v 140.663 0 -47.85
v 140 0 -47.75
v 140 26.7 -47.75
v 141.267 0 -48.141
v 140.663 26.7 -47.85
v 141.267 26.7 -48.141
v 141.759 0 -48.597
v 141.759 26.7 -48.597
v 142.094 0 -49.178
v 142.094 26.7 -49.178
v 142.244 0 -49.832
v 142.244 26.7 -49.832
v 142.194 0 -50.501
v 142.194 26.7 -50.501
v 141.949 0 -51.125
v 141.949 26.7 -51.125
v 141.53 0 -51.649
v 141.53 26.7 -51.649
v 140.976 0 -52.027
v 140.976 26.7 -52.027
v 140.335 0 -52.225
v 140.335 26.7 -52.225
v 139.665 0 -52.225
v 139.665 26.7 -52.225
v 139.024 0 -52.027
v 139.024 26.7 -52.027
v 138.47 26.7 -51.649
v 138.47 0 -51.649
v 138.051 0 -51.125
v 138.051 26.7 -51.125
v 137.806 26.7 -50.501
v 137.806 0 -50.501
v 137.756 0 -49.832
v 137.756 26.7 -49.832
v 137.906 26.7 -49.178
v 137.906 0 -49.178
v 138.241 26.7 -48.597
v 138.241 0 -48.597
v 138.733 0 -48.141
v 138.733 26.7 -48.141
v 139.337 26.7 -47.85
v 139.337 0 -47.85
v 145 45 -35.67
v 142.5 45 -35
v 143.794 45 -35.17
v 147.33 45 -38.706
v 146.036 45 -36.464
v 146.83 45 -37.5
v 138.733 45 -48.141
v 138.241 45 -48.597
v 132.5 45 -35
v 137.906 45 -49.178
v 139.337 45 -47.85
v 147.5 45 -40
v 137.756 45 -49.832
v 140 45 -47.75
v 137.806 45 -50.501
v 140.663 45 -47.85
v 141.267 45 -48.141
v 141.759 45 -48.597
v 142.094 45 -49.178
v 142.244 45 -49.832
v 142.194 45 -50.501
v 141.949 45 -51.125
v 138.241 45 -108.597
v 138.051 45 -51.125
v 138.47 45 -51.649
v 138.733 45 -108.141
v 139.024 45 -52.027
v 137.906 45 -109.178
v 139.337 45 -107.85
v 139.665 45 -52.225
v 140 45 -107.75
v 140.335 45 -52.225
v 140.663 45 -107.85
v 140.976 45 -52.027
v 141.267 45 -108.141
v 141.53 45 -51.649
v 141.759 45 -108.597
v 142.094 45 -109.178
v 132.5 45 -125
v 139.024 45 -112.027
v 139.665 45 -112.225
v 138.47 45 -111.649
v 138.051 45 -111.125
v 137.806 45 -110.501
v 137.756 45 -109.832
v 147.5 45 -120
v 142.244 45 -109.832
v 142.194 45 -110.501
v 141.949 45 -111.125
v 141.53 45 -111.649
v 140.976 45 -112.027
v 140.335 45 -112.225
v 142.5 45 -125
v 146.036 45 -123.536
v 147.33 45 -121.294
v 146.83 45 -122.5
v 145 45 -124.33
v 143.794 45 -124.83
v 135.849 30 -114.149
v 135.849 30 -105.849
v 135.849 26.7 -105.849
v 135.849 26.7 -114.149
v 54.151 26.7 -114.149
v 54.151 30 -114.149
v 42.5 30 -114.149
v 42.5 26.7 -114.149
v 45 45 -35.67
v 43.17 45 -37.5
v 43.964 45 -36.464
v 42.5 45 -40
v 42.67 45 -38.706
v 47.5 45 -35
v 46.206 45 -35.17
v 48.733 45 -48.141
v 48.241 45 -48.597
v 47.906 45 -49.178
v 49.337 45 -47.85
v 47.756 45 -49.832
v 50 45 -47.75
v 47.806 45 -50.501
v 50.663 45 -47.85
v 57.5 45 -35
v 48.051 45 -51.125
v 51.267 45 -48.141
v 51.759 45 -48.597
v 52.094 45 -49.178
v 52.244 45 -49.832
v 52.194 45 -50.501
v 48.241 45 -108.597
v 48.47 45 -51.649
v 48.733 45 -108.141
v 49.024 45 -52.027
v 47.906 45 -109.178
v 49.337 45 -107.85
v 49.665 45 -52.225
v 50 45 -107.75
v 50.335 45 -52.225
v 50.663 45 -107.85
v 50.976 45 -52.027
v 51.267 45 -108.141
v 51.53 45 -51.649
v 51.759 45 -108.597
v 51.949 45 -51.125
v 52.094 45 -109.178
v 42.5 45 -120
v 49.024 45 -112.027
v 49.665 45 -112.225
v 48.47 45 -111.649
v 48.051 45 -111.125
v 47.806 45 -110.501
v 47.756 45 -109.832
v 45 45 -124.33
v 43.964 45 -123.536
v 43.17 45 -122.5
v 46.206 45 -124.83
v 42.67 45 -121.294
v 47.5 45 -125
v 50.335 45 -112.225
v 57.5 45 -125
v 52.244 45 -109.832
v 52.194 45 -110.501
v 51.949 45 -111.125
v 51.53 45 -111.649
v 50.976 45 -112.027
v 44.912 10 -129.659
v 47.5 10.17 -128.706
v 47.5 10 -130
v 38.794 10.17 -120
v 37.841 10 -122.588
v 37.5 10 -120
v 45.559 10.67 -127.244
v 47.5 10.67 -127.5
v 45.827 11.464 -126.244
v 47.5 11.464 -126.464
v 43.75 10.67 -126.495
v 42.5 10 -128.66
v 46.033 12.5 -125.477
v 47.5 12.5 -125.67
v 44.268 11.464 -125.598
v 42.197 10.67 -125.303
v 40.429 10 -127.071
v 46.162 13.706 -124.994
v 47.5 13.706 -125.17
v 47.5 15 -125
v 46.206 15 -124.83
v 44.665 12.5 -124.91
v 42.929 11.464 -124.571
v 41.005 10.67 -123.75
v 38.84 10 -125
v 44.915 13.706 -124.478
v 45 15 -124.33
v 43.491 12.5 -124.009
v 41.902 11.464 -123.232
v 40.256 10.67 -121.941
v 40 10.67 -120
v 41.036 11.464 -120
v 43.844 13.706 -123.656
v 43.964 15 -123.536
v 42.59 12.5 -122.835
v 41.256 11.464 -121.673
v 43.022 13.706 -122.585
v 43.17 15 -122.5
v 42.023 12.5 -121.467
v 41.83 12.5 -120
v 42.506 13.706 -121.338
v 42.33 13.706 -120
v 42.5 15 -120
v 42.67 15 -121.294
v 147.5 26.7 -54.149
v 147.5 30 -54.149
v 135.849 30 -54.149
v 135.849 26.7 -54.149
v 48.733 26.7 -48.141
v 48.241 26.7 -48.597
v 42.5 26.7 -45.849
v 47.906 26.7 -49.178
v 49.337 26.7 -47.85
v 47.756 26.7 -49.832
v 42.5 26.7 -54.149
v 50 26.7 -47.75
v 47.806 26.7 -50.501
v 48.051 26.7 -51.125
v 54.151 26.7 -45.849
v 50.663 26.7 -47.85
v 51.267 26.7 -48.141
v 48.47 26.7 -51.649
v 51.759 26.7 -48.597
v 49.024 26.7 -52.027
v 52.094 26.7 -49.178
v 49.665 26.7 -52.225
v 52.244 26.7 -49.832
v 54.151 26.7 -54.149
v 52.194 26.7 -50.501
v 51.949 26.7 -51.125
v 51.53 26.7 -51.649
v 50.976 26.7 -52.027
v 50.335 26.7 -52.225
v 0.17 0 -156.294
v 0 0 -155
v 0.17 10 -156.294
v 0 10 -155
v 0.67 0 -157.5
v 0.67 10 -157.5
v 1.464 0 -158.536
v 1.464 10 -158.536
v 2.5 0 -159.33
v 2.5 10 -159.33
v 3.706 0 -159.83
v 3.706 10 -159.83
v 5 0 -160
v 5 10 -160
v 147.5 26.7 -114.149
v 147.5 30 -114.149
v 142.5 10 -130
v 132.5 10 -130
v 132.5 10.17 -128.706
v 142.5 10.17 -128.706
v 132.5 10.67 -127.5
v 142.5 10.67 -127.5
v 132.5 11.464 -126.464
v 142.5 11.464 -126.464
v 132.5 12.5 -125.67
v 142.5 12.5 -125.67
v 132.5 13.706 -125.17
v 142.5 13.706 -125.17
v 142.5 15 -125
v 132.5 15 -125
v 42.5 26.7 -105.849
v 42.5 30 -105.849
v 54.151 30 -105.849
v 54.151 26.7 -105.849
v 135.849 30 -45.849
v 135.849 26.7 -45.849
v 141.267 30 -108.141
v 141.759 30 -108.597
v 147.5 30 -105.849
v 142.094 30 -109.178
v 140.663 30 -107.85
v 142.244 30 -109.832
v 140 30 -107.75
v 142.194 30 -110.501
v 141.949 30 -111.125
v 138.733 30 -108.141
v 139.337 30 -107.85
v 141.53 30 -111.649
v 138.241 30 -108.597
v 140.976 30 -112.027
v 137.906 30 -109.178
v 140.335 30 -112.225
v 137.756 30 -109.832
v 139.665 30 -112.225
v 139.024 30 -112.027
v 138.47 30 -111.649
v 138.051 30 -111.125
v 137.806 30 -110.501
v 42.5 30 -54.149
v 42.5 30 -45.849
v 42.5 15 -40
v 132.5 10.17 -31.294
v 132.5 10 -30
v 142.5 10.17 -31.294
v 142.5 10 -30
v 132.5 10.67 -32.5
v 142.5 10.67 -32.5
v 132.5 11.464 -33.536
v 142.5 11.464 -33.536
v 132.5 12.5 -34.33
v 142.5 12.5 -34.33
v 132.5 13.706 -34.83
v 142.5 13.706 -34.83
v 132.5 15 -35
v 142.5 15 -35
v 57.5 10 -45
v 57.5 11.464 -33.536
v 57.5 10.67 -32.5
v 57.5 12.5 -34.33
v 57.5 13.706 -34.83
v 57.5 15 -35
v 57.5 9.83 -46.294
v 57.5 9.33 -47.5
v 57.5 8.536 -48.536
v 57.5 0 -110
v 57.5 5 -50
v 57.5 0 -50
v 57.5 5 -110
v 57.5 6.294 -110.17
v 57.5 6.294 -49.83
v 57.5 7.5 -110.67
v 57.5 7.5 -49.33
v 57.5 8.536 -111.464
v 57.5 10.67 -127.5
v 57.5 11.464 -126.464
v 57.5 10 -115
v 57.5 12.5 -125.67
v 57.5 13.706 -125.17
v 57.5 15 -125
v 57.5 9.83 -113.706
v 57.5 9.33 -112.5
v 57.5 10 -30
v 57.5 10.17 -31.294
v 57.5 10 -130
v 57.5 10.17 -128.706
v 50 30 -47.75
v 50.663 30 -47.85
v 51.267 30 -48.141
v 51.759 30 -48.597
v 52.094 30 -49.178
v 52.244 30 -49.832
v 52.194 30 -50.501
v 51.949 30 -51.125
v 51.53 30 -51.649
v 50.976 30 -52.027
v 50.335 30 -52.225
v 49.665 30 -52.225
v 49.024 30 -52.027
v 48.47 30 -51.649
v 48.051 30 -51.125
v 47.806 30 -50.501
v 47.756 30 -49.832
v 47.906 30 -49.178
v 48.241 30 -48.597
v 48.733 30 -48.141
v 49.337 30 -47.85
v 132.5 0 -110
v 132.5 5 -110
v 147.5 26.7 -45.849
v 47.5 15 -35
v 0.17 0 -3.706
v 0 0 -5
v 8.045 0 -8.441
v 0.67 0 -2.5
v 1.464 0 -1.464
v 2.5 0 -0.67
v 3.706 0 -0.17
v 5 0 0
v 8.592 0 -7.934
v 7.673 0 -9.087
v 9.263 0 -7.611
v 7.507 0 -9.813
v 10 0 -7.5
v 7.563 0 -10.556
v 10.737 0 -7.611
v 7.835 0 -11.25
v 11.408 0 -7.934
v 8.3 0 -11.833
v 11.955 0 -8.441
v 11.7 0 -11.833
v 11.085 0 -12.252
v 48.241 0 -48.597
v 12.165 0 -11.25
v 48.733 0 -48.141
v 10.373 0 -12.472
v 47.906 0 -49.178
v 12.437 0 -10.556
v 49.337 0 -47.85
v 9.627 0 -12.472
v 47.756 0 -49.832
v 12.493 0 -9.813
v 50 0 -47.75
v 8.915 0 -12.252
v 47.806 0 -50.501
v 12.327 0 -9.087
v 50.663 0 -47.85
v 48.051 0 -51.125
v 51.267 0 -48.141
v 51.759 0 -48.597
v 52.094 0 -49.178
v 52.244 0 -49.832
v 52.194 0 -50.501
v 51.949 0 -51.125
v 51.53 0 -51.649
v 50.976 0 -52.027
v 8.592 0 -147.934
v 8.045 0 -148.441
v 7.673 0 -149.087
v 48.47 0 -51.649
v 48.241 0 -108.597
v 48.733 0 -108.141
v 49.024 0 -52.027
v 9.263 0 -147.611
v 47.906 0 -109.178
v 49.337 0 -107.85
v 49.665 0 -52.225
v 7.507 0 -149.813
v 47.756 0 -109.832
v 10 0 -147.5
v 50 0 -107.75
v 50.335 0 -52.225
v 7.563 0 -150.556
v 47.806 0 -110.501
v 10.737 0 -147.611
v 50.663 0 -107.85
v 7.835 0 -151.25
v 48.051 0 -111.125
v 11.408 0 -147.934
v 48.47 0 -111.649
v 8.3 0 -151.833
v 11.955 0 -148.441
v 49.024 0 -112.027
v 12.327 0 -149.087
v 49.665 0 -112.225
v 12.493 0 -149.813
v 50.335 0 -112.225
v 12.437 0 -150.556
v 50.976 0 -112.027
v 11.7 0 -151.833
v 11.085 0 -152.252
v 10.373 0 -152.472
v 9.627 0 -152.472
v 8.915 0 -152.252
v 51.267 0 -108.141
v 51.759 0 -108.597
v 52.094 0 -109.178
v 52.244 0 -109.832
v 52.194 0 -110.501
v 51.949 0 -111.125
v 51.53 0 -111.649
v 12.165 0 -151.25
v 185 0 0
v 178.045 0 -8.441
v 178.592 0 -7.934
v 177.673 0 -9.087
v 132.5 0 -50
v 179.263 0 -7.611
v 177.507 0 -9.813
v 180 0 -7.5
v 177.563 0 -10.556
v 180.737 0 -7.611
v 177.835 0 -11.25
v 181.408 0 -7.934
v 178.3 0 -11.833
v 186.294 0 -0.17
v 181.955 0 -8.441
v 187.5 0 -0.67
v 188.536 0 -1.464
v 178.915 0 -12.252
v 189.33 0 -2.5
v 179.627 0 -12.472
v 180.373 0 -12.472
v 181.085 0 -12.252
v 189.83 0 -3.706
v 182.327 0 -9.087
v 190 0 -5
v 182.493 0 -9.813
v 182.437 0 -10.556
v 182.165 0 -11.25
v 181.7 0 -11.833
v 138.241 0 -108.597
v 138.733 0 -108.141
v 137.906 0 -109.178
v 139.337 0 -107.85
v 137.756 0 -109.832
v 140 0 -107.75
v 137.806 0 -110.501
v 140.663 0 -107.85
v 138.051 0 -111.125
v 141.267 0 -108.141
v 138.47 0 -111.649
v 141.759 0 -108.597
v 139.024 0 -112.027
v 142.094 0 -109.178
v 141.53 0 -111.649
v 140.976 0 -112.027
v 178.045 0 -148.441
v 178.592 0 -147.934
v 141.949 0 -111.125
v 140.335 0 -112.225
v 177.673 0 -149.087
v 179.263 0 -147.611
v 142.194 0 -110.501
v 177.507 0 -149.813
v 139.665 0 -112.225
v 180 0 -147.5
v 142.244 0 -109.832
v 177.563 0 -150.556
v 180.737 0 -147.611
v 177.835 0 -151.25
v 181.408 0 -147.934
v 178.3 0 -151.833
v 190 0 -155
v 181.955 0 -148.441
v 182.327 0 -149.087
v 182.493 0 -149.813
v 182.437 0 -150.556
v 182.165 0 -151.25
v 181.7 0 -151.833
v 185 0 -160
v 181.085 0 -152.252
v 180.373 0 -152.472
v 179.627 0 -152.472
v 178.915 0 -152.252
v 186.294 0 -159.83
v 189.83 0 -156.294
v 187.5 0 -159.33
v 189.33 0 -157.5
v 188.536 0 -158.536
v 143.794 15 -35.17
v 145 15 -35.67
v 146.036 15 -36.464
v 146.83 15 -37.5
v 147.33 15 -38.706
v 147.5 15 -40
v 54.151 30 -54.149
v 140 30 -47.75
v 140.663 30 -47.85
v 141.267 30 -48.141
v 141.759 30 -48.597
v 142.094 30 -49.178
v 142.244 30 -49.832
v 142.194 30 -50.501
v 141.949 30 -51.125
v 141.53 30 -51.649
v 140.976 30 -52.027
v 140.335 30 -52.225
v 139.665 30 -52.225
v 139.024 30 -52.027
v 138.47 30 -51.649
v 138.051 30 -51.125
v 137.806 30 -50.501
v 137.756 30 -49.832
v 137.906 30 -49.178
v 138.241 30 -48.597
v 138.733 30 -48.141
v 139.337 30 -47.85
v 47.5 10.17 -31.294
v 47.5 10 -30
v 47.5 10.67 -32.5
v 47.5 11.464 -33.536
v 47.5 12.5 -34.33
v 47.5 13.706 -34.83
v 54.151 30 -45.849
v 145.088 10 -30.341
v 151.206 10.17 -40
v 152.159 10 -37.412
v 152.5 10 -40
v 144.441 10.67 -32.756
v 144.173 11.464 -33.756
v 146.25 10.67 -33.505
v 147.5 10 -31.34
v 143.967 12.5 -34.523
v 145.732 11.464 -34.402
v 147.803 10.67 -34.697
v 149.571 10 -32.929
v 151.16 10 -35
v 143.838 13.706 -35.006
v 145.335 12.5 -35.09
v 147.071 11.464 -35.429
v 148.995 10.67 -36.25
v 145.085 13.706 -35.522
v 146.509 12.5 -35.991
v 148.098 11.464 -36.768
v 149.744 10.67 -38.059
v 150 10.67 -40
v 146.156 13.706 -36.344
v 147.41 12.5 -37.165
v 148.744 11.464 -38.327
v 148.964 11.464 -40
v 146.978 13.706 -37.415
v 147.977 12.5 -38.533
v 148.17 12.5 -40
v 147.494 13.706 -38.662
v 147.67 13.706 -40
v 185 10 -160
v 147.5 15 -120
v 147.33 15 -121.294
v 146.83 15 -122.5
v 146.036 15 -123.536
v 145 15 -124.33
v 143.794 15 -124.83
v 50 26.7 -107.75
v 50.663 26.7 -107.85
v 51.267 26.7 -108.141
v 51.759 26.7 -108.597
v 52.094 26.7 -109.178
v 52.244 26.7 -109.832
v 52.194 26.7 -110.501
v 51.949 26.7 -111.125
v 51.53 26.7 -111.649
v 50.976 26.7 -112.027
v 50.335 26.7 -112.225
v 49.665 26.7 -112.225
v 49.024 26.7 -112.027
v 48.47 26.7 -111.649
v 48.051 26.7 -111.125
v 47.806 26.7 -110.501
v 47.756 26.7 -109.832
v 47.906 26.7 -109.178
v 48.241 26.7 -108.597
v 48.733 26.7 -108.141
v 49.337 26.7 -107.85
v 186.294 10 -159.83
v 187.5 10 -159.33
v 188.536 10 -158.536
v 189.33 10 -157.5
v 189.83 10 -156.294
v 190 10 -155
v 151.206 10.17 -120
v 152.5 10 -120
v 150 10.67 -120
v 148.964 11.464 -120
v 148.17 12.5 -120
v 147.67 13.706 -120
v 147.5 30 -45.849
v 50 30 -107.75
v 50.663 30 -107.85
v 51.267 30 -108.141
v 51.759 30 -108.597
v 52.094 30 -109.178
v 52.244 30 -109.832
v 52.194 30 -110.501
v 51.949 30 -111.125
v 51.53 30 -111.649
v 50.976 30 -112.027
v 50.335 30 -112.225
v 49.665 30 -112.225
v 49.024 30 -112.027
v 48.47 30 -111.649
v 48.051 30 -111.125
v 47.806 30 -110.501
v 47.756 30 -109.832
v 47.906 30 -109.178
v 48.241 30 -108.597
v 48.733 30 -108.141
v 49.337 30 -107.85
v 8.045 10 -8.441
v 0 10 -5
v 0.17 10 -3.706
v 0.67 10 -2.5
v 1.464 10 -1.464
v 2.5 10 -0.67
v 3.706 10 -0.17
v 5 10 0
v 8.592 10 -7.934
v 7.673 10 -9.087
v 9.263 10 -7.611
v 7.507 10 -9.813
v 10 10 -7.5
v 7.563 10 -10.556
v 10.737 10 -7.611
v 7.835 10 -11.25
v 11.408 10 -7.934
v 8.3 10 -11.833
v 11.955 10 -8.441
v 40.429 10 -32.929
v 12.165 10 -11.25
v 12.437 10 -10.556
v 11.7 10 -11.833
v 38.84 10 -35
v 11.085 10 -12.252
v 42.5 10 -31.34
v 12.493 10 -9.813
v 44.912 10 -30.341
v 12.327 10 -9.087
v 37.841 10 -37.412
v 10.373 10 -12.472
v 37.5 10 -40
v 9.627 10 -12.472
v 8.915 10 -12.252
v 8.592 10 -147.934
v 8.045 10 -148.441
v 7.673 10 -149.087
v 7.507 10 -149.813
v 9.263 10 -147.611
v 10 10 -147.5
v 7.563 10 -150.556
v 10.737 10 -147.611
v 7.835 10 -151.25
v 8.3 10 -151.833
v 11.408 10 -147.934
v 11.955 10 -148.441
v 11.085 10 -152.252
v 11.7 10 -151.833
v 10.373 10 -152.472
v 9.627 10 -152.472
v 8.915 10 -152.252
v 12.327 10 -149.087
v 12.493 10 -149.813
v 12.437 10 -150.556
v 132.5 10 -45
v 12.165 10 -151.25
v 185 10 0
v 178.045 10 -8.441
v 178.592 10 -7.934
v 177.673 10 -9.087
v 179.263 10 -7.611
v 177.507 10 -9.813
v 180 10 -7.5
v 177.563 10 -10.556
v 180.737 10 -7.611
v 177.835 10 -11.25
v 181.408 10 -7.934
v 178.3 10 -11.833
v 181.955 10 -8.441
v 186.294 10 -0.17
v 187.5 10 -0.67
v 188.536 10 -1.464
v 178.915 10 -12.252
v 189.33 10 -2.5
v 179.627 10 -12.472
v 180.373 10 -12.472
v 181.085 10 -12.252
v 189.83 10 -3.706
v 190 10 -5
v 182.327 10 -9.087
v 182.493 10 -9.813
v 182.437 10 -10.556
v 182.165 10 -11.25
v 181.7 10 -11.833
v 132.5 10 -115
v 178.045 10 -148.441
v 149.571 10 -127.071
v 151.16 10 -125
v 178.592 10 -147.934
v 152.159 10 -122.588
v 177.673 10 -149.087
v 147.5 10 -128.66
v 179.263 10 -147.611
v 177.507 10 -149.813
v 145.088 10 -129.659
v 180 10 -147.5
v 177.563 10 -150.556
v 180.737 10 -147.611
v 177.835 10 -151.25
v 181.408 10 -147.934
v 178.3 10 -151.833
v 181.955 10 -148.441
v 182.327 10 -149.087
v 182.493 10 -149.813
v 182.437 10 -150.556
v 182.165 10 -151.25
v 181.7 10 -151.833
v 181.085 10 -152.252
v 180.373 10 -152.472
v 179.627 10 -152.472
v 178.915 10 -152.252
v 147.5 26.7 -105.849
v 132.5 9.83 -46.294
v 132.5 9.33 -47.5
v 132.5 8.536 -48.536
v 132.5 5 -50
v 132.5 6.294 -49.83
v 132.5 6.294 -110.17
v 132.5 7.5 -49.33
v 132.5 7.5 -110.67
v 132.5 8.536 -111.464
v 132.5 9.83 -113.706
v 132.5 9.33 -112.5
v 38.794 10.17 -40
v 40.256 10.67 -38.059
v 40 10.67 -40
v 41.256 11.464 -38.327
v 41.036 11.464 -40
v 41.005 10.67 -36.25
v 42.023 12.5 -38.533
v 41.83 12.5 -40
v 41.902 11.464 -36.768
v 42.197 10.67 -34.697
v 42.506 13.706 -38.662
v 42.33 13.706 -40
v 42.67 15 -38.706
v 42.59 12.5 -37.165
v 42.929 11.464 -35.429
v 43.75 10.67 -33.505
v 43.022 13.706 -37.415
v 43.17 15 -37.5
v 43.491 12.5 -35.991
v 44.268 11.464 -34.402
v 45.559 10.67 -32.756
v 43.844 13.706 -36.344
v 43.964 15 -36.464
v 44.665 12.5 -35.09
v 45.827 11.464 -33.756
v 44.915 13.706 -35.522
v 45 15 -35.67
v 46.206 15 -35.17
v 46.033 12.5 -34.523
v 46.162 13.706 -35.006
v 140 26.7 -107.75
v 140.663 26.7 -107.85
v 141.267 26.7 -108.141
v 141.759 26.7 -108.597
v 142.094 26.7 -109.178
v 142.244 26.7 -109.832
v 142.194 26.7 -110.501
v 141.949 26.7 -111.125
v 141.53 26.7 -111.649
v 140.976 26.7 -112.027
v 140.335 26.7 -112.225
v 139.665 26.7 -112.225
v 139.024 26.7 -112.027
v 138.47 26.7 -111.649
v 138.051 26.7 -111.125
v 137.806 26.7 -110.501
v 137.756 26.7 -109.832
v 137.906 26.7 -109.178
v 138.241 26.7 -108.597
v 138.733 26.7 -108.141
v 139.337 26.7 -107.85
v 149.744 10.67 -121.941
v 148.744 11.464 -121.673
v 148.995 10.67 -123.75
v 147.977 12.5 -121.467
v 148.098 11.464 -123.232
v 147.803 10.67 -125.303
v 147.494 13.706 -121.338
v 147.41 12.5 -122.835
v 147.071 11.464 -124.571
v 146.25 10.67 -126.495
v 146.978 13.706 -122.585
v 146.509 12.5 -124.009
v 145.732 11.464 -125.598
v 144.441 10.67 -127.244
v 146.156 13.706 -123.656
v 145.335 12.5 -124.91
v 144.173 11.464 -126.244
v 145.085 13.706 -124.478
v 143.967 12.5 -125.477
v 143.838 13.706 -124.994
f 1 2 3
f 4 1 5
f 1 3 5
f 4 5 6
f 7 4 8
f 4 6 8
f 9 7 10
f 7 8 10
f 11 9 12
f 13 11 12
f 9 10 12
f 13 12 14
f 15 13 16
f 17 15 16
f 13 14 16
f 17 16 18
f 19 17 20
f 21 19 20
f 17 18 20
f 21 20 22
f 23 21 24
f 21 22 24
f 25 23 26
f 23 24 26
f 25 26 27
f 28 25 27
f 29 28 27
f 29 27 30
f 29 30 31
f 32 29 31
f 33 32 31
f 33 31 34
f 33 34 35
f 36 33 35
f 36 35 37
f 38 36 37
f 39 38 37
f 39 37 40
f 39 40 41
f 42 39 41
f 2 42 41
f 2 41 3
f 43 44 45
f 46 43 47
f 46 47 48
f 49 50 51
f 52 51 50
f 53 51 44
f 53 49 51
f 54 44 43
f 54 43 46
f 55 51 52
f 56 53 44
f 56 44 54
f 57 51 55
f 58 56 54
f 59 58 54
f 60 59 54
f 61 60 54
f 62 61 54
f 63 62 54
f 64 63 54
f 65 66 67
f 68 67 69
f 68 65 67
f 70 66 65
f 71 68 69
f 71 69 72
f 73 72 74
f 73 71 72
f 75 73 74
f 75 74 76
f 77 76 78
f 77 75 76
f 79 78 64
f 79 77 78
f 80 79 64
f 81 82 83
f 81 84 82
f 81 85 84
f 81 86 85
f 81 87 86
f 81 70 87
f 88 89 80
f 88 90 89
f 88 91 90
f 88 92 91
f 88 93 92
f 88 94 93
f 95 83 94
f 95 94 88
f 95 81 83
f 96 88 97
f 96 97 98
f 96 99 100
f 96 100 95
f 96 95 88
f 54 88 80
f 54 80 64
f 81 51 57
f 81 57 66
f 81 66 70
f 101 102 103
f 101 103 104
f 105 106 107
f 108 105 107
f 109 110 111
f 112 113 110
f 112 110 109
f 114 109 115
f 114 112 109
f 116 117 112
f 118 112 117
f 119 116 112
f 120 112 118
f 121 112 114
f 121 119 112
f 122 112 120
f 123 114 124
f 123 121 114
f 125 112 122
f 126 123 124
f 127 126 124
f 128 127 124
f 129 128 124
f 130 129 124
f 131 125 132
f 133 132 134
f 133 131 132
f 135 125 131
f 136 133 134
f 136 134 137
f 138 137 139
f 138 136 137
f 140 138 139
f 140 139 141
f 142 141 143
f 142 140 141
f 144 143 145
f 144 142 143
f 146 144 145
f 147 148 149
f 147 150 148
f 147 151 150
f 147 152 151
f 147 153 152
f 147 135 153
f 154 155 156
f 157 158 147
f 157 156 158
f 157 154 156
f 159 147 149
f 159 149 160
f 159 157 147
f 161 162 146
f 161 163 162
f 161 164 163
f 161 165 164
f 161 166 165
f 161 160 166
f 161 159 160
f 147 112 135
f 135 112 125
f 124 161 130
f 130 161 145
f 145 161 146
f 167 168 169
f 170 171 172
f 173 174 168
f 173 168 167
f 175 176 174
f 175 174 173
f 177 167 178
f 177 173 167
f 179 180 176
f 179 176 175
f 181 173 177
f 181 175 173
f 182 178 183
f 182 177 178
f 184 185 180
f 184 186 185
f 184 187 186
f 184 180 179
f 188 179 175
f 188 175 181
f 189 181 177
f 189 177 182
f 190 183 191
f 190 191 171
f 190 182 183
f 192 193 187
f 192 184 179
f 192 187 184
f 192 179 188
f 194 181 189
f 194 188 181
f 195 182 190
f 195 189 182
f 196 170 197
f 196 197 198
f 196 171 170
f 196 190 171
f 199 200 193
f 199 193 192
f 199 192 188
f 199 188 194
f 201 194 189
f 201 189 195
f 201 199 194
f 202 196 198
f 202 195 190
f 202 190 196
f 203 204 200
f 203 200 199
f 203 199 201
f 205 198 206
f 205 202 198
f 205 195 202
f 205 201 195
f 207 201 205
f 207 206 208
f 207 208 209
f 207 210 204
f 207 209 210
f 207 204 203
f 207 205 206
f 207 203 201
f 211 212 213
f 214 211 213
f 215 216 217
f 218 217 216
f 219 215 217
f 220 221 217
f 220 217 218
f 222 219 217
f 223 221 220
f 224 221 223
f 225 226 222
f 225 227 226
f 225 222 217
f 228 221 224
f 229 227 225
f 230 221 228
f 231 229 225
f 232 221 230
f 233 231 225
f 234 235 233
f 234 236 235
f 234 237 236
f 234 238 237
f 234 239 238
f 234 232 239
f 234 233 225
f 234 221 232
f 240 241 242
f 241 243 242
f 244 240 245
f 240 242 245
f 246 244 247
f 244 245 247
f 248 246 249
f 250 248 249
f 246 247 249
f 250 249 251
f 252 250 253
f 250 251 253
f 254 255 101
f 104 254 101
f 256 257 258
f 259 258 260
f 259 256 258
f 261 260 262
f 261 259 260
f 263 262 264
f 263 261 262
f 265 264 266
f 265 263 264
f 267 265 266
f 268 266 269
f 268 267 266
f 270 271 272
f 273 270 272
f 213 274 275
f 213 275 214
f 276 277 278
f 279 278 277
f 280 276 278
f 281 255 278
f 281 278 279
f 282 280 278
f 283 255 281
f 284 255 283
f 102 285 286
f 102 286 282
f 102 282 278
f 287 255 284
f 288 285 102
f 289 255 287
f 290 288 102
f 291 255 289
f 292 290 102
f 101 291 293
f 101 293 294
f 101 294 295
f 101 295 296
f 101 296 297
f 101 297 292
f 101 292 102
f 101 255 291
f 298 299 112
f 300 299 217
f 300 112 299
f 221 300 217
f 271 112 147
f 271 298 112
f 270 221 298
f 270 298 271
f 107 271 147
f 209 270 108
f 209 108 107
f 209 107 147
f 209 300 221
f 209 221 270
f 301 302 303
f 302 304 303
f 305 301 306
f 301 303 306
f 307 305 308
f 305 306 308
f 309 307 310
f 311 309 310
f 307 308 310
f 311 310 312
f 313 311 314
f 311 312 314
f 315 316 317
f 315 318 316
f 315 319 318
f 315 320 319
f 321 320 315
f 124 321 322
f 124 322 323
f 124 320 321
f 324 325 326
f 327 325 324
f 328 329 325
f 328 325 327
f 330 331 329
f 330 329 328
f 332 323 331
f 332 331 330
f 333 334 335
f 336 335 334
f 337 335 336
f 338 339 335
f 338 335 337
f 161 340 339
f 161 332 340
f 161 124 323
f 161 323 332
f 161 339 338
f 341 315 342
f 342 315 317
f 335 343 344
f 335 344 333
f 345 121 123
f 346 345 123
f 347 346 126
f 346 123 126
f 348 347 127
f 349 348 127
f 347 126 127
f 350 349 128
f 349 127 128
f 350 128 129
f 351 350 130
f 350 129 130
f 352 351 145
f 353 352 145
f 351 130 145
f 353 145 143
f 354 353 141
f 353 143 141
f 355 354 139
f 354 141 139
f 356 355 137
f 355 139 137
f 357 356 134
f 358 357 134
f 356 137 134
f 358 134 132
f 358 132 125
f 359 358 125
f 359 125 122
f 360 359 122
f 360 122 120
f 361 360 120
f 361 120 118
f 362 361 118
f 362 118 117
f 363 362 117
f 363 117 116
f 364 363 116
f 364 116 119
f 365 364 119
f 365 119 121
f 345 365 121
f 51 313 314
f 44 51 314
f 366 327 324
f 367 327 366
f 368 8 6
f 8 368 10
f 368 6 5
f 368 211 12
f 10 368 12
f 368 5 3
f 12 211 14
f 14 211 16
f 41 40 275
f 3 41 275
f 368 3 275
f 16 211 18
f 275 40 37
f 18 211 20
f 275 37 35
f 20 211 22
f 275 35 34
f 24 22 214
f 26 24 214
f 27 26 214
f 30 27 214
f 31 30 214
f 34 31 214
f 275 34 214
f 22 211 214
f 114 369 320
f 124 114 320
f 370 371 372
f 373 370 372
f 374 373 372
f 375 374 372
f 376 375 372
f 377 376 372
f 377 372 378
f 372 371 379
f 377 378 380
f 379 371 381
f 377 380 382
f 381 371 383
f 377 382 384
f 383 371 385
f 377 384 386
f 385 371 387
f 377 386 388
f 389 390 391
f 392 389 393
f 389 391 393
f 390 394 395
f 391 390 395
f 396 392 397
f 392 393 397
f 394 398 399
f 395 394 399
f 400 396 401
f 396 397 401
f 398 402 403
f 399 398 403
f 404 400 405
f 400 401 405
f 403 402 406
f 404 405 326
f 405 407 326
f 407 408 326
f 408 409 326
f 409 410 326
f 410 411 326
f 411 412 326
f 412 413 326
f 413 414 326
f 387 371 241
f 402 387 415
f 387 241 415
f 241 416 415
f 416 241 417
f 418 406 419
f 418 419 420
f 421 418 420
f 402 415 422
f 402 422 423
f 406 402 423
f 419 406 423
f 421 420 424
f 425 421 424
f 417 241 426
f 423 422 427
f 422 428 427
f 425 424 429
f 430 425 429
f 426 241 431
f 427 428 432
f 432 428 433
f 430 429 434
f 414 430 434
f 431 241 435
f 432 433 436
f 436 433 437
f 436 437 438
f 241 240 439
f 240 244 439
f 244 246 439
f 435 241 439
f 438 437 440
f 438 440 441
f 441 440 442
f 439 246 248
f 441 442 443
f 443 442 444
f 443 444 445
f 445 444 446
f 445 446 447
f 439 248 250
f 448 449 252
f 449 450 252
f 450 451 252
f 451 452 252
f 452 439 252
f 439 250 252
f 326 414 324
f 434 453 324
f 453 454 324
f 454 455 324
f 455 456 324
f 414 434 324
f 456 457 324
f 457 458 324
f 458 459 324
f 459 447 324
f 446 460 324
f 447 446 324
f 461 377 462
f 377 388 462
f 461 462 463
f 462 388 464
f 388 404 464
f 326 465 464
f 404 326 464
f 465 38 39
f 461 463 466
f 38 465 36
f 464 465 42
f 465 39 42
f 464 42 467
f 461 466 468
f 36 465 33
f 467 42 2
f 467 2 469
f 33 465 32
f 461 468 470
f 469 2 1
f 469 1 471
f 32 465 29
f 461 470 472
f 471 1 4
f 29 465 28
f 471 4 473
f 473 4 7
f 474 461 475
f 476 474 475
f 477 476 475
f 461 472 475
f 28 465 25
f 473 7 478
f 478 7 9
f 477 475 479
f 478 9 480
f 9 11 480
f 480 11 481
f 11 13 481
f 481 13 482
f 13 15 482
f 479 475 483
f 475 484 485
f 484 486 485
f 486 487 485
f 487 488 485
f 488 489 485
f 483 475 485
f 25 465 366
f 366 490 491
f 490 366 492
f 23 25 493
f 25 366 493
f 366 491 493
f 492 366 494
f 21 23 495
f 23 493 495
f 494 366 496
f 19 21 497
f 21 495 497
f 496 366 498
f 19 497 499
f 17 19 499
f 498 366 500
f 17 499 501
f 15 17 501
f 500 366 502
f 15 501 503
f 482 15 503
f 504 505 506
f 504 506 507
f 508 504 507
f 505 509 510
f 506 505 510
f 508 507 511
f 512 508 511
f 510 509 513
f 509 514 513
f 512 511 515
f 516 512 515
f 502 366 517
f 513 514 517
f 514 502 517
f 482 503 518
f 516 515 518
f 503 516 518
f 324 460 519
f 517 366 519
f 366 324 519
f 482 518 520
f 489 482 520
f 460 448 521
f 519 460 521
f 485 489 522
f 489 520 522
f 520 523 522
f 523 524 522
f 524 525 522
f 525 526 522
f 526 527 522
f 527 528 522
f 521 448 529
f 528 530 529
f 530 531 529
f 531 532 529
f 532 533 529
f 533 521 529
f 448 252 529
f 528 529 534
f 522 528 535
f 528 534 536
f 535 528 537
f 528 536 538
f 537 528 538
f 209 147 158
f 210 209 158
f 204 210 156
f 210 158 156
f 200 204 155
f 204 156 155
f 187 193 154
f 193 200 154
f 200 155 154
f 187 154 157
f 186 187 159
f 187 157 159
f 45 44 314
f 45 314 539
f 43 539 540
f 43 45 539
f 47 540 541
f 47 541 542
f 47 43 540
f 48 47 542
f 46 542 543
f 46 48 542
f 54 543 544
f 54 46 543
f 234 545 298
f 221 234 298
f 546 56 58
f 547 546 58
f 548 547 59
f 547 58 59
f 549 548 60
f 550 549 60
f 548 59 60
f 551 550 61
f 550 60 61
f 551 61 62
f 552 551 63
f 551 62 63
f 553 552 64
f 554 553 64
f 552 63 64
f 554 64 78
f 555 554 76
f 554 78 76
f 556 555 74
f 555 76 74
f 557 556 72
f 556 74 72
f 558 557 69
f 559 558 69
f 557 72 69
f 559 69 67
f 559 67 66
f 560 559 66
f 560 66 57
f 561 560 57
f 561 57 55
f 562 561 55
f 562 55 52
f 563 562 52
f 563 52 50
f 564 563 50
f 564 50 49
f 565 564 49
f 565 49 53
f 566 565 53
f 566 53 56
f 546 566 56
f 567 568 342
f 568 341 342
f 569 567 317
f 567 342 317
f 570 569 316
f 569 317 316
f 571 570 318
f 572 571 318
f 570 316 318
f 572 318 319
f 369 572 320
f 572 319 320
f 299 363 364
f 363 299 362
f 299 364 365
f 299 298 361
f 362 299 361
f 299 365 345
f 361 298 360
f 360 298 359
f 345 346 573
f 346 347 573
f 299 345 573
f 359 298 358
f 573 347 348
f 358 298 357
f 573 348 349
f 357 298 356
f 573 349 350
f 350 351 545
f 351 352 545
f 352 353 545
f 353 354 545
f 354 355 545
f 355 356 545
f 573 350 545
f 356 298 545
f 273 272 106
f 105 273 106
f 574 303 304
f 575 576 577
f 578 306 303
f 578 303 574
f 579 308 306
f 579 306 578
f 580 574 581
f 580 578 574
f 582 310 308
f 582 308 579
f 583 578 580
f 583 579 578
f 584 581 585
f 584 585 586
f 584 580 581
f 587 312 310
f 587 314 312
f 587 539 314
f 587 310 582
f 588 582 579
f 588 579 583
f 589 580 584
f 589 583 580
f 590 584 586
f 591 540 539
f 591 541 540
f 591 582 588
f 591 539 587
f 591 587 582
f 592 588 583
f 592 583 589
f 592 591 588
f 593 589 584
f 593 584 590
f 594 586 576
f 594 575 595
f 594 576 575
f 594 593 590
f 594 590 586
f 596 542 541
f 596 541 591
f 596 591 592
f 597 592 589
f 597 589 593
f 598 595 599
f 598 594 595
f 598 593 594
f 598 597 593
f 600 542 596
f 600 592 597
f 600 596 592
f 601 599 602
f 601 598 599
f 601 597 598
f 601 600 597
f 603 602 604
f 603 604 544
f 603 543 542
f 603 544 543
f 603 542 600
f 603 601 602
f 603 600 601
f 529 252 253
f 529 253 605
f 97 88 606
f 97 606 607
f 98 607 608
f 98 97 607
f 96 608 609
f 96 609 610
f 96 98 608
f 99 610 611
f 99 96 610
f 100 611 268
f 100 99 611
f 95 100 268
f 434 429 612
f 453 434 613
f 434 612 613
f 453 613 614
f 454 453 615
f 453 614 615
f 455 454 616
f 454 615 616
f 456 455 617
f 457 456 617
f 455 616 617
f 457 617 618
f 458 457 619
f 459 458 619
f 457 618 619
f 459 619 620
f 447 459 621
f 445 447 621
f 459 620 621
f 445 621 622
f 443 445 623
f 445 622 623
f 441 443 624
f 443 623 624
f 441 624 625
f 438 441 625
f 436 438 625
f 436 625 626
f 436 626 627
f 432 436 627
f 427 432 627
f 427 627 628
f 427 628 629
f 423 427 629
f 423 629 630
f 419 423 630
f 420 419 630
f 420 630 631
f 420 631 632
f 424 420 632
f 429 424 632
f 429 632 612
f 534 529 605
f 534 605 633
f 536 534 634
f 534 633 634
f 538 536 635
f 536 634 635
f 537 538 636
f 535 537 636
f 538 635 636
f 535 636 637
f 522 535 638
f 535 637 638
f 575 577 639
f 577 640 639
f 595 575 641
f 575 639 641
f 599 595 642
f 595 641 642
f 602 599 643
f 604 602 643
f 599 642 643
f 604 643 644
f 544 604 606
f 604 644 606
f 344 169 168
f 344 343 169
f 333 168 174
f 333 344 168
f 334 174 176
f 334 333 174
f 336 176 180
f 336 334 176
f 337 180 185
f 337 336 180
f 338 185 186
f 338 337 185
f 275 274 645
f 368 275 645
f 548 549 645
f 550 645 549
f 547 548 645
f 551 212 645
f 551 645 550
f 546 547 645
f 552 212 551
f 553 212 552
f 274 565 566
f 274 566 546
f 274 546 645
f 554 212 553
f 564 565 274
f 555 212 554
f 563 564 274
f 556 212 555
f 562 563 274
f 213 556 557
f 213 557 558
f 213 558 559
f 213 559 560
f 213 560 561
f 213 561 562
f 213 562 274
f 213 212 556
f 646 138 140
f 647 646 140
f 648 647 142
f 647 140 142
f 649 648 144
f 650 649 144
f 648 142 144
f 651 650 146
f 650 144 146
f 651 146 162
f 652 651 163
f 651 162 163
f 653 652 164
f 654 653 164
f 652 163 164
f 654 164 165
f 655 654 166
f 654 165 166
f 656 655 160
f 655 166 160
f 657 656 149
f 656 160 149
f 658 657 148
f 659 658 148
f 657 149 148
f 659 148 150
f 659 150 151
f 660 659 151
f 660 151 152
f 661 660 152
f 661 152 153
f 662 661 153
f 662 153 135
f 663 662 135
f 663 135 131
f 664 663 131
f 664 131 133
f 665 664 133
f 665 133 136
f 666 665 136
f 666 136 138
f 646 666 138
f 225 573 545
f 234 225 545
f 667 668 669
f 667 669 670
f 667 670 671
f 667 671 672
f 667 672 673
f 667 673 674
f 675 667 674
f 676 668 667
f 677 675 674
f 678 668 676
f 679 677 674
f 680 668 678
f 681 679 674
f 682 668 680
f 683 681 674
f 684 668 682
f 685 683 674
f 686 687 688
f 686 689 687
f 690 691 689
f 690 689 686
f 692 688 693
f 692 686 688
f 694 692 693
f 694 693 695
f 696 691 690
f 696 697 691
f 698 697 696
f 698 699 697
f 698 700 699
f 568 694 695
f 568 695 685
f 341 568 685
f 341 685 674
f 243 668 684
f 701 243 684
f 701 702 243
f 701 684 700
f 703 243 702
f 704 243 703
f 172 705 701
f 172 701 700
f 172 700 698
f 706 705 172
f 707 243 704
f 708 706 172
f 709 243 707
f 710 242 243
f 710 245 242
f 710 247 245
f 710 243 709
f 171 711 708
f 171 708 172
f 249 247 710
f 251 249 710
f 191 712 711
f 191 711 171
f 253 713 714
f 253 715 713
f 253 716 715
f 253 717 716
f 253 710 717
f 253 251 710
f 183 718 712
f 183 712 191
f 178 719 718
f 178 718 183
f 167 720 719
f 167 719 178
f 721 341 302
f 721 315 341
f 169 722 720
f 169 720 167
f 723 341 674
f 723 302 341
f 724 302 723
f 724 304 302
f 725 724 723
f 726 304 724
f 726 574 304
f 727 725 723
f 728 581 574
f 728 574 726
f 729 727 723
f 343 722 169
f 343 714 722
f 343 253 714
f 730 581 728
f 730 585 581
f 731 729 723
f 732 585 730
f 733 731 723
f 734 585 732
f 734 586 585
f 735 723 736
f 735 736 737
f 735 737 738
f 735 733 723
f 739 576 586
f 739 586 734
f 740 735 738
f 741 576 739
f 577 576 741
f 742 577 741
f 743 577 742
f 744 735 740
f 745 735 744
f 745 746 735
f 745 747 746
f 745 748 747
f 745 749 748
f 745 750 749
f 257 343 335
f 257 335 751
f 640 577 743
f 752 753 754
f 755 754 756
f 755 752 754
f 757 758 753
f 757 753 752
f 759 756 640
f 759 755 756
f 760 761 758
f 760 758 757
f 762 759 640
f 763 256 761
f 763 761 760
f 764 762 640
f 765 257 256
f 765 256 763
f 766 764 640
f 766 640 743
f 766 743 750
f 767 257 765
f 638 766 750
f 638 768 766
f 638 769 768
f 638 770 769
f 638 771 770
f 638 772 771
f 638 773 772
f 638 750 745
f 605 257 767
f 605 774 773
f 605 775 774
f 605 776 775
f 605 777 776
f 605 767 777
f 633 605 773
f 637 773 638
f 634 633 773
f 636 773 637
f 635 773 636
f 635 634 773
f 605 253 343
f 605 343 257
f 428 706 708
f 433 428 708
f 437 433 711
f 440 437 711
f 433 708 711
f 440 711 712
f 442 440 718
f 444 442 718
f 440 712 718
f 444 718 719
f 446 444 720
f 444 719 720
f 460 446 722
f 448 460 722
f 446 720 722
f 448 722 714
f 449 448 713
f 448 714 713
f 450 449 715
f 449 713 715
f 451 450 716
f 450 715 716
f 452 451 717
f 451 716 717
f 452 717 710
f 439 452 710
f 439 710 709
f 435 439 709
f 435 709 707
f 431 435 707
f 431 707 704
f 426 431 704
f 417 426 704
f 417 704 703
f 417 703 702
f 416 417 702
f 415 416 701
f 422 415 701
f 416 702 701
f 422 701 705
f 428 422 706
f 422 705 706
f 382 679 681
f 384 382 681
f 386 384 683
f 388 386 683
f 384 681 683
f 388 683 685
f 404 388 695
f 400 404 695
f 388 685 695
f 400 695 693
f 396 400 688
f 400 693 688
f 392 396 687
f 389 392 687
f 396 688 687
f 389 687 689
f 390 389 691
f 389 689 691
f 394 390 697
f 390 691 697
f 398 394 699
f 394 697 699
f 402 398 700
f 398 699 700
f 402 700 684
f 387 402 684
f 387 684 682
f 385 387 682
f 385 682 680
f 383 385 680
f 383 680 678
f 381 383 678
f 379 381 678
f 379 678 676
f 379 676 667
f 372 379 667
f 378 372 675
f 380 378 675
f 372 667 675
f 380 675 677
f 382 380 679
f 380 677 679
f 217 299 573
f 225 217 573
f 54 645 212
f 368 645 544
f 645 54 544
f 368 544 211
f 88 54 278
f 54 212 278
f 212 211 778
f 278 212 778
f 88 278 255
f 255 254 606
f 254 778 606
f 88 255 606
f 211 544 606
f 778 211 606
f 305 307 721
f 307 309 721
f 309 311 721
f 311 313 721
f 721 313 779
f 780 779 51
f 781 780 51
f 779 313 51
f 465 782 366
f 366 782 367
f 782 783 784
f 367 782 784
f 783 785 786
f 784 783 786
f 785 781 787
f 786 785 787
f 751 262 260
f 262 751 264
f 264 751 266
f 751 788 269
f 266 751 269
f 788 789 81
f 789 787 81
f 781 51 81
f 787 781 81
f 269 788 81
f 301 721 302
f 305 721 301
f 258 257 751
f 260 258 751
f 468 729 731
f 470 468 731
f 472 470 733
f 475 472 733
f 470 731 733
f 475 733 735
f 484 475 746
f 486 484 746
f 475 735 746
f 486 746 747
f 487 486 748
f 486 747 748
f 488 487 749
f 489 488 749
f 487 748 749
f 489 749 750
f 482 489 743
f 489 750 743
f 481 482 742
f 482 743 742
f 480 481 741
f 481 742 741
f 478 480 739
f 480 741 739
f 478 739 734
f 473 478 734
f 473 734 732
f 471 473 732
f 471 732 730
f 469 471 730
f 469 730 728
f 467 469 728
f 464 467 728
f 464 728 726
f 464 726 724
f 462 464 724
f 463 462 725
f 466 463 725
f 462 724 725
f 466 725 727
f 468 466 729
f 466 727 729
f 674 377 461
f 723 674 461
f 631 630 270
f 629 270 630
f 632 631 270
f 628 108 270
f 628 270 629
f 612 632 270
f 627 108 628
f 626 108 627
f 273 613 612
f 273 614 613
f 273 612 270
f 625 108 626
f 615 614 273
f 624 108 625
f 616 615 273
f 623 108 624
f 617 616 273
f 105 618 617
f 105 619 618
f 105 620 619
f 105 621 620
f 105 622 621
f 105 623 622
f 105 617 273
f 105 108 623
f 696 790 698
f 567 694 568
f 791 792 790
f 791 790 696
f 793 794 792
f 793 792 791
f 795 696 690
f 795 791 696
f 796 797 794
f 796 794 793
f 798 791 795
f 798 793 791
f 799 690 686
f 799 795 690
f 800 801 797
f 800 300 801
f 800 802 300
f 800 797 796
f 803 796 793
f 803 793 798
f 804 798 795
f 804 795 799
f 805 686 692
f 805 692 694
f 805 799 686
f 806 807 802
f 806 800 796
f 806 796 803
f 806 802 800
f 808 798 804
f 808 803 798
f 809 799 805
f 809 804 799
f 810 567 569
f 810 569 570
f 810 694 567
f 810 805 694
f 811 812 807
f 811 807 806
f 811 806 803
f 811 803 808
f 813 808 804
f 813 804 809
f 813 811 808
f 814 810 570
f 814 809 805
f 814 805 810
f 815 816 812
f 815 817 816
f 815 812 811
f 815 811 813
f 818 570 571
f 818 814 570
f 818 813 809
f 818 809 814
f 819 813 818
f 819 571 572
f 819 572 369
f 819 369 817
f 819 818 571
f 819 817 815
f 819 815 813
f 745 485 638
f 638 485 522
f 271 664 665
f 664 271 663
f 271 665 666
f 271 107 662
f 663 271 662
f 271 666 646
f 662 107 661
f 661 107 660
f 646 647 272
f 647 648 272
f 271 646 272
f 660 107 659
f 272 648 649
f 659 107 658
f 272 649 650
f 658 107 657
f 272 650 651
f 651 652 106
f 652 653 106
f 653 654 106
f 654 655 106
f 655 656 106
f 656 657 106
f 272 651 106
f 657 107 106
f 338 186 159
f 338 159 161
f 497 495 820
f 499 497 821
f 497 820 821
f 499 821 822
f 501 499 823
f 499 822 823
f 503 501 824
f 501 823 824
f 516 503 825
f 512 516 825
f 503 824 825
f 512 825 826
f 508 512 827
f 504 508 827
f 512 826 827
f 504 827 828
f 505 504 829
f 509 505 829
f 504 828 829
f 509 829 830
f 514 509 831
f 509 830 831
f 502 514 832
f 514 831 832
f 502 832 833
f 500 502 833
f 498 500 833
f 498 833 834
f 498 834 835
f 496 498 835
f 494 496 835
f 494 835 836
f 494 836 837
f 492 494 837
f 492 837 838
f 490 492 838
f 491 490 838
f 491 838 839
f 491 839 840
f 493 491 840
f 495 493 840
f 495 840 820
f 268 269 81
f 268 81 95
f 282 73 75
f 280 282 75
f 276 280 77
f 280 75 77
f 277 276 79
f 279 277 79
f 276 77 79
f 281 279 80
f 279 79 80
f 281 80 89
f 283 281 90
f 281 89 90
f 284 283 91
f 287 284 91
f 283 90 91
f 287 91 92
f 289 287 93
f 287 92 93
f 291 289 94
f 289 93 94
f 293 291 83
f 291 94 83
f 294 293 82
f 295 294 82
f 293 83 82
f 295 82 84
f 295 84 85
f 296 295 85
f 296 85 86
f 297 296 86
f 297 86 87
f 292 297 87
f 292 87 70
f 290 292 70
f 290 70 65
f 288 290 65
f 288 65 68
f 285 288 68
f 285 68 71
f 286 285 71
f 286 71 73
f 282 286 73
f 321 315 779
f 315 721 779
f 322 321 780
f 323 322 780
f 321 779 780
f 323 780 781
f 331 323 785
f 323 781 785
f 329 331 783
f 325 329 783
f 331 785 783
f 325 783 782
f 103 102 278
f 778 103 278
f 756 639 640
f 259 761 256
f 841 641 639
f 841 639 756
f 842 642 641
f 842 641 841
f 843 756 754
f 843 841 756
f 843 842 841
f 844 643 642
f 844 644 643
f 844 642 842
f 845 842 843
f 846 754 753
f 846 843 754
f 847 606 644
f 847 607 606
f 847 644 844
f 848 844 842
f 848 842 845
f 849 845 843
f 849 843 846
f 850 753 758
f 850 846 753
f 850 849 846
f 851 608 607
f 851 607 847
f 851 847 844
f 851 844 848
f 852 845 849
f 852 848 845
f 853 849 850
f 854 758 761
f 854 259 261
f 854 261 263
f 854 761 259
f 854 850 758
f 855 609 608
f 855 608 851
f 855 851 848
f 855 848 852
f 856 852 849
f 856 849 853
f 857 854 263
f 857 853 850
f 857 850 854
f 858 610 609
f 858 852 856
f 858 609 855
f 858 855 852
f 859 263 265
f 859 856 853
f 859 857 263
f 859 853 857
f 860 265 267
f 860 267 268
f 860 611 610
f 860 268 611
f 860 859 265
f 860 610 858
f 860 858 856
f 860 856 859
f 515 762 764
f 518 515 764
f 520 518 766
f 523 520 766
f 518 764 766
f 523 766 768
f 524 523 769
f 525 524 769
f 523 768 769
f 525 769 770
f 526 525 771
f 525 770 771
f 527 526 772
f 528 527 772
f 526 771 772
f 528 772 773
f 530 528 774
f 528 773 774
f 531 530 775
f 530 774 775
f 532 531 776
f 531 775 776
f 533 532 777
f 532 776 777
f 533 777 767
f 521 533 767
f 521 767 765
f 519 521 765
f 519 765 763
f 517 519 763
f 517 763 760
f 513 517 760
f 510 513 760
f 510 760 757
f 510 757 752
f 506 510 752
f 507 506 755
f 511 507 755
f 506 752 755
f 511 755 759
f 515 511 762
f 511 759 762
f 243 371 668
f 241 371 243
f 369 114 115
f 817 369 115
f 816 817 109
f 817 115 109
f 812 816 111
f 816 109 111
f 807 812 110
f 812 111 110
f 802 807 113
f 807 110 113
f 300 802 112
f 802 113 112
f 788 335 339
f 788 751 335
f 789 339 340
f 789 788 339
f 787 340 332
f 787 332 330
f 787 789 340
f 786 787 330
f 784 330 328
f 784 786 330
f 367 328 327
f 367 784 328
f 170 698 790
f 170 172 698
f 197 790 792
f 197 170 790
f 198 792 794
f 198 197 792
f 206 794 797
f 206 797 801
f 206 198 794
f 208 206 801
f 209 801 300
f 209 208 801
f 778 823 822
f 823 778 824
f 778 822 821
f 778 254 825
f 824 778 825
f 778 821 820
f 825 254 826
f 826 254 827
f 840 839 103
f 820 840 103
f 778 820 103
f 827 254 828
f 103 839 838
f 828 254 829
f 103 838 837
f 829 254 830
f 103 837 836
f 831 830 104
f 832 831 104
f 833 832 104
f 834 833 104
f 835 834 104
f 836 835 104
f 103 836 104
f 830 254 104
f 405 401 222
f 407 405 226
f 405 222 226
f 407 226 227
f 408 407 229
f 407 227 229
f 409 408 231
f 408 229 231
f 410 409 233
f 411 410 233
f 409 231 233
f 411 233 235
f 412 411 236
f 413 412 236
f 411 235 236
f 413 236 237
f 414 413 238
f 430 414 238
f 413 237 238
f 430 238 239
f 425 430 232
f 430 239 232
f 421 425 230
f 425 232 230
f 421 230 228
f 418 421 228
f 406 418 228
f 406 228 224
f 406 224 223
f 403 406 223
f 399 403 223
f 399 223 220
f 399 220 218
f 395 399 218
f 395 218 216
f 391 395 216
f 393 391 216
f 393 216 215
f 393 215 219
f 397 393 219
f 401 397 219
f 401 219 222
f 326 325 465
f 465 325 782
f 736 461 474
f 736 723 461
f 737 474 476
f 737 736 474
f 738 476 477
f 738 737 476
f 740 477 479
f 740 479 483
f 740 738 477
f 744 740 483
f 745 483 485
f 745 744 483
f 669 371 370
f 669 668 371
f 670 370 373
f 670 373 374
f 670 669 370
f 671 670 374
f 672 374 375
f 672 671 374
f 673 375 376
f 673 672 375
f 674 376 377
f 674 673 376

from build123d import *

# Parameters (mm, degrees)
SKETCH1_W           = 190
SKETCH1_H           = 160
BOSS_EXTRUDE1_DEPTH = 10
SKETCH3_W           = 15
SKETCH3_H           = 90
BOSS_EXTRUDE3_DEPTH = 35
SKETCH4_R           = 2.25
CUT_EXTRUDE1_DEPTH  = 50
SKETCH5_W           = 75
SKETCH5_H           = 60
CUT_EXTRUDE2_DEPTH  = 50
SKETCH8_R           = 2.5
CUT_EXTRUDE4_DEPTH  = 10
FILLET1_R           = 5
FILLET2_R           = 5
CUT_EXTRUDE5_DEPTH  = 3.3


with BuildPart() as part:
    # Sketch1 → Boss-Extrude1 (new body)
    with BuildSketch(Plane(origin=(0, 0, 0), x_dir=(1, 0, 0), z_dir=(0, 1, 0))):
        with Locations((95, 80)):
            Rectangle(SKETCH1_W, SKETCH1_H)
    extrude(amount=BOSS_EXTRUDE1_DEPTH)

    # Sketch3 → Boss-Extrude3 (add)
    with BuildSketch(Plane(origin=(0, 10, 0), x_dir=(1, 0, 0), z_dir=(0, 1, 0))):
        with Locations((50, 80)):
            Rectangle(SKETCH3_W, SKETCH3_H)
        with Locations((140, 80)):
            Rectangle(SKETCH3_W, SKETCH3_H)
    extrude(amount=BOSS_EXTRUDE3_DEPTH)

    # Sketch4 → Cut-Extrude1 (cut)
    with BuildSketch(Plane(origin=(0, 45, 0), x_dir=(1, 0, 0), z_dir=(0, 1, 0))):
        with Locations(Location((50, 110, 0), (0, 0, 270))):
            Circle(SKETCH4_R)
        with Locations(Location((140, 110, 0), (0, 0, 270))):
            Circle(SKETCH4_R)
        with Locations(Location((140, 50, 0), (0, 0, 270))):
            Circle(SKETCH4_R)
        with Locations(Location((50, 50, 0), (0, 0, 270))):
            Circle(SKETCH4_R)
    extrude(amount=-CUT_EXTRUDE1_DEPTH, mode=Mode.SUBTRACT)

    # Sketch5 → Cut-Extrude2 (cut)
    with BuildSketch(Plane(origin=(0, 10, 0), x_dir=(1, 0, 0), z_dir=(0, 1, 0))):
        with Locations((95, 80)):
            Rectangle(SKETCH5_W, SKETCH5_H)
    extrude(amount=-CUT_EXTRUDE2_DEPTH, mode=Mode.SUBTRACT)

    # Sketch8 → Cut-Extrude4 (cut)
    with BuildSketch(Plane(origin=(0, 10, 0), x_dir=(1, 0, 0), z_dir=(0, 1, 0))):
        with Locations(Location((10, 150, 0), (0, 0, 270))):
            Circle(SKETCH8_R)
        with Locations(Location((180, 150, 0), (0, 0, 270))):
            Circle(SKETCH8_R)
        with Locations(Location((180, 10, 0), (0, 0, 270))):
            Circle(SKETCH8_R)
        with Locations(Location((10, 10, 0), (0, 0, 270))):
            Circle(SKETCH8_R)
    extrude(amount=-CUT_EXTRUDE4_DEPTH, mode=Mode.SUBTRACT)

    # Fillet1
    fillet1_edges = [part.edges().sort_by_distance(p)[0] for p in [
        (50, 10, -125),
        (42.5, 10, -80),
        (42.5, 27.5, -125),
        (50, 10, -35),
        (42.5, 27.5, -35),
        (147.5, 10, -80),
        (147.5, 27.5, -35),
        (140, 10, -125),
        (147.5, 27.5, -125),
        (140, 10, -35),
        (0, 5, -160),
        (190, 5, -160),
        (190, 5, 0),
        (0, 5, 0),
    ]]
    fillet(fillet1_edges, radius=FILLET1_R)

    # Fillet2
    fillet2_edges = [part.edges().sort_by_distance(p)[0] for p in [
        (95, 10, -50),
        (95, 10, -110),
    ]]
    fillet(fillet2_edges, radius=FILLET2_R)

    # Sketch10 → Cut-Extrude5 (cut)
    with BuildSketch(Plane(origin=(0, 30, 0), x_dir=(1, 0, 0), z_dir=(0, 1, 0))):
        Polygon((45.851380251, 54.148619749), (42.5, 54.148619749), (42.5, 45.848619749), (45.845857409, 45.848619749), (54.151380251, 45.848619749), (54.151380251, 54.148619749), align=None)
        Polygon((42.5, 105.848619749), (45.845857409, 105.848619749), (54.151380251, 105.848619749), (54.151380251, 114.148619749), (45.851380251, 114.148619749), (42.5, 114.148619749), align=None)
        Polygon((147.5, 45.848619749), (144.154142591, 45.848619749), (135.848619749, 45.848619749), (135.848619749, 54.148619749), (144.148619749, 54.148619749), (147.5, 54.148619749), align=None)
        Polygon((147.5, 114.148619749), (147.5, 105.848619749), (144.154142591, 105.848619749), (135.848619749, 105.848619749), (135.848619749, 114.148619749), (144.148619749, 114.148619749), align=None)
    extrude(amount=-CUT_EXTRUDE5_DEPTH, mode=Mode.SUBTRACT)


solid = part.part
